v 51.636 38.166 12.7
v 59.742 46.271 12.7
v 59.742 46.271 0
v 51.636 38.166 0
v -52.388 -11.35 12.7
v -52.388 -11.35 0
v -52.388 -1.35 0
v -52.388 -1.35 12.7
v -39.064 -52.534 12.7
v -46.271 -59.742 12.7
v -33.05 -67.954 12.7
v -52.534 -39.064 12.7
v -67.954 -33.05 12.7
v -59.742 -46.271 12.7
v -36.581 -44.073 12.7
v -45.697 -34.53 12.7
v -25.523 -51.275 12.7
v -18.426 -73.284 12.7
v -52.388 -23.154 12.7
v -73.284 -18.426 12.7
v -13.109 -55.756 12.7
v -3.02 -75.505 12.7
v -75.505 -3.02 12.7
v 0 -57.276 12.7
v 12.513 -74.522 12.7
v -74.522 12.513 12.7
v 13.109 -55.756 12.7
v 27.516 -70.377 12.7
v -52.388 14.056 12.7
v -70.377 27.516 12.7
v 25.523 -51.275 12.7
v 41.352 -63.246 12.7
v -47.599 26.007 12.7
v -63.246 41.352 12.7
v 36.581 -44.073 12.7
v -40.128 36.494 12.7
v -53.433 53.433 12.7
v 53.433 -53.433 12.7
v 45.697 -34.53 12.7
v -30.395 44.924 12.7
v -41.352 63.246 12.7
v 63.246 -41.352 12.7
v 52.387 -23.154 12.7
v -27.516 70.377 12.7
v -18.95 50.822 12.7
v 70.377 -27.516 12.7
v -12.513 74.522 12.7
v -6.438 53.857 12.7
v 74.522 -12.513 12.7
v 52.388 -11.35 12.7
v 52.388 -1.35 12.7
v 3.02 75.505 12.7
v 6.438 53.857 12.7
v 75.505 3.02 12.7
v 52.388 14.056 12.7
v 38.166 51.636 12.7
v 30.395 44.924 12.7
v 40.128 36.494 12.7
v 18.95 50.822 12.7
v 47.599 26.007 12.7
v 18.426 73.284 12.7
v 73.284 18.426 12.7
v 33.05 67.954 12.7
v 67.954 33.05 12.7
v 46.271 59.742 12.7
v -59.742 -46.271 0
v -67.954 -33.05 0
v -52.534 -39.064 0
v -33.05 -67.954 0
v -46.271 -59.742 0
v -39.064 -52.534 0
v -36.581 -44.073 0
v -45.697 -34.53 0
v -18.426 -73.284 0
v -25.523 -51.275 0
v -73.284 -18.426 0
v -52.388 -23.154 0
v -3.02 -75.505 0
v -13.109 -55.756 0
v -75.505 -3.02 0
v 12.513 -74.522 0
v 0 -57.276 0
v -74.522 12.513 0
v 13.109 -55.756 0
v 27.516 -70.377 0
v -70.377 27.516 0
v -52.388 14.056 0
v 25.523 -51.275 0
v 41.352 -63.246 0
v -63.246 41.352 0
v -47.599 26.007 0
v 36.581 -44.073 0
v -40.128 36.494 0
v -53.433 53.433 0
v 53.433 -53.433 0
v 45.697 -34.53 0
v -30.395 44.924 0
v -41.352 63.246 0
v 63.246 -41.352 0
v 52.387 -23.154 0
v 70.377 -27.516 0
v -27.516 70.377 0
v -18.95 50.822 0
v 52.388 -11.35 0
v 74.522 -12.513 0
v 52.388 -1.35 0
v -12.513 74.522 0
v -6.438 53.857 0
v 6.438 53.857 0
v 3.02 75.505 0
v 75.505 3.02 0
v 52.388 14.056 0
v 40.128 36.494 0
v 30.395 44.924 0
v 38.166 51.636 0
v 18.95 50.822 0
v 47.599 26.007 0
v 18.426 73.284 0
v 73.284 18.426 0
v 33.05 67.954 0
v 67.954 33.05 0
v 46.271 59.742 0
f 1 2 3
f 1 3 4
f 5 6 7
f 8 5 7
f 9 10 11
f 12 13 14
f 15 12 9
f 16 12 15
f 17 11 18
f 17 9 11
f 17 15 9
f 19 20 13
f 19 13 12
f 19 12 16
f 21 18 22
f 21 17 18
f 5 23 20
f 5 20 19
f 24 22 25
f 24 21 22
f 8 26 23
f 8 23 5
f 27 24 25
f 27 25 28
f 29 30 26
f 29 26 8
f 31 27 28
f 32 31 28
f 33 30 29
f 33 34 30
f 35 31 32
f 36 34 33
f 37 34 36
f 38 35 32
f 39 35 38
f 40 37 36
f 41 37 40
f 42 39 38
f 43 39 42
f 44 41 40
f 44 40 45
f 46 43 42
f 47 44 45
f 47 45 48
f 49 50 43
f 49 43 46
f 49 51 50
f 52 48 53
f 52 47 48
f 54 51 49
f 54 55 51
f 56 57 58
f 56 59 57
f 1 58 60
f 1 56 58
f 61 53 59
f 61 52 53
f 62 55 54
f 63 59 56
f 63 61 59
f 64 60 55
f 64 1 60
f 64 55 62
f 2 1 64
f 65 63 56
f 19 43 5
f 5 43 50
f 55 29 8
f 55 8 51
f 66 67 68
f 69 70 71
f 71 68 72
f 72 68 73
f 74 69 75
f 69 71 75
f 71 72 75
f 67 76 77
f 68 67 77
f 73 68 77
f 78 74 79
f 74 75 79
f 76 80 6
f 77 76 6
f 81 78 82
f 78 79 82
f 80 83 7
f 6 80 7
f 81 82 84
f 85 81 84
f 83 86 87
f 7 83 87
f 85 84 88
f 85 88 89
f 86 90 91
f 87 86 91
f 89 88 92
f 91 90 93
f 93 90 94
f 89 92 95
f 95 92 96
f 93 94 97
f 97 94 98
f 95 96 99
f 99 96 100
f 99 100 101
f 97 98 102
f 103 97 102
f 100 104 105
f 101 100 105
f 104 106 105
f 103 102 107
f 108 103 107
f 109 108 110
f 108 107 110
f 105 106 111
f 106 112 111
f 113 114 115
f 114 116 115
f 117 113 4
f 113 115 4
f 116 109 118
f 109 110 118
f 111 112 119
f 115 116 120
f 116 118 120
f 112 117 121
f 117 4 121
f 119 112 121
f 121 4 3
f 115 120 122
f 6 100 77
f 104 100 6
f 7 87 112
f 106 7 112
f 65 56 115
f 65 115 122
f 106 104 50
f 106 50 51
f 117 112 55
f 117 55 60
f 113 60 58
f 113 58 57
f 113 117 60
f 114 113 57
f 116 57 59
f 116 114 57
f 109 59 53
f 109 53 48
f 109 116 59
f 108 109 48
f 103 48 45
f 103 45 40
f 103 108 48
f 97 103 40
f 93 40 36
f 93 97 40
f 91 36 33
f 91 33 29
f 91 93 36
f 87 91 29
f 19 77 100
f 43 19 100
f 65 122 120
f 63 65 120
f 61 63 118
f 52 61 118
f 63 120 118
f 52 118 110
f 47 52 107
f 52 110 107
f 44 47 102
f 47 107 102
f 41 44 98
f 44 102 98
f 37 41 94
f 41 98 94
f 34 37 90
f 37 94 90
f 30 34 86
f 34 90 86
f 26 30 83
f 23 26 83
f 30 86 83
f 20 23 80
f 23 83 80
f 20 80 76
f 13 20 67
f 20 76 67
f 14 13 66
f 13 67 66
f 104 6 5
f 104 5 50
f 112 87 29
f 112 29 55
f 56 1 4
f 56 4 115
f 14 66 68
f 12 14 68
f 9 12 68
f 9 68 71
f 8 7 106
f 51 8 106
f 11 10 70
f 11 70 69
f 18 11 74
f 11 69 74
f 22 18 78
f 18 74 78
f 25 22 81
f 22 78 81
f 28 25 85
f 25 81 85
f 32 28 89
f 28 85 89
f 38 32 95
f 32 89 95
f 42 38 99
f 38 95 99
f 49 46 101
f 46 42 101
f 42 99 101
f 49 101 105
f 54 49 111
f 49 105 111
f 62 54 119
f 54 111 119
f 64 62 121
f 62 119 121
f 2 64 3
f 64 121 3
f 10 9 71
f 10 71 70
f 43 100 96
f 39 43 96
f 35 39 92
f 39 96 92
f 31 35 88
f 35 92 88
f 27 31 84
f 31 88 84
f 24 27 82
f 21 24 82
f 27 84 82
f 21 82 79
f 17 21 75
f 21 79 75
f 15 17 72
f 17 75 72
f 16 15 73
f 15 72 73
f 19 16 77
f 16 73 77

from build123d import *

# Parameters (mm, degrees)
SKETCH1_R           = 75.565
SKETCH1_W           = 104.775
SKETCH1_H           = 10
BOSS_EXTRUDE1_DEPTH = 12.7
CUT_EXTRUDE1_DEPTH  = 12.7


with BuildPart() as part:
    # Sketch1 → Boss-Extrude1 (new body)
    with BuildSketch(Plane.XY):
        Circle(SKETCH1_R)
        with BuildLine():
            Line((-52.3875, 14.055637656), (52.3875, 14.055637656))
            ThreePointArc((52.3875, 14.055637656), (0, 54.240308869), (-52.3875, 14.055637656))
        make_face(mode=Mode.SUBTRACT)
        with Locations((0, -6.35)):
            Rectangle(SKETCH1_W, SKETCH1_H, mode=Mode.SUBTRACT)
        with BuildLine():
            Line((-52.3875, -23.154456235), (52.3875, -23.154456235))
            ThreePointArc((52.3875, -23.154456235), (0, -57.276338917), (-52.3875, -23.154456235))
        make_face(mode=Mode.SUBTRACT)
    extrude(amount=BOSS_EXTRUDE1_DEPTH)

    # Sketch3 → Cut-Extrude1 (cut)
    with BuildSketch(Plane.XY.offset(12.7)):
        Polygon((47.146344636, 60.616728817), (60.616728817, 47.146344636), (51.636472696, 38.166088515), (38.166088515, 51.636472696), align=None)
        Polygon((-52.534498308, -39.064114127), (-39.064114127, -52.534498308), (-48.044370248, -61.514754429), (-61.514754429, -48.044370248), align=None)
    extrude(amount=-CUT_EXTRUDE1_DEPTH, mode=Mode.SUBTRACT)


solid = part.part
